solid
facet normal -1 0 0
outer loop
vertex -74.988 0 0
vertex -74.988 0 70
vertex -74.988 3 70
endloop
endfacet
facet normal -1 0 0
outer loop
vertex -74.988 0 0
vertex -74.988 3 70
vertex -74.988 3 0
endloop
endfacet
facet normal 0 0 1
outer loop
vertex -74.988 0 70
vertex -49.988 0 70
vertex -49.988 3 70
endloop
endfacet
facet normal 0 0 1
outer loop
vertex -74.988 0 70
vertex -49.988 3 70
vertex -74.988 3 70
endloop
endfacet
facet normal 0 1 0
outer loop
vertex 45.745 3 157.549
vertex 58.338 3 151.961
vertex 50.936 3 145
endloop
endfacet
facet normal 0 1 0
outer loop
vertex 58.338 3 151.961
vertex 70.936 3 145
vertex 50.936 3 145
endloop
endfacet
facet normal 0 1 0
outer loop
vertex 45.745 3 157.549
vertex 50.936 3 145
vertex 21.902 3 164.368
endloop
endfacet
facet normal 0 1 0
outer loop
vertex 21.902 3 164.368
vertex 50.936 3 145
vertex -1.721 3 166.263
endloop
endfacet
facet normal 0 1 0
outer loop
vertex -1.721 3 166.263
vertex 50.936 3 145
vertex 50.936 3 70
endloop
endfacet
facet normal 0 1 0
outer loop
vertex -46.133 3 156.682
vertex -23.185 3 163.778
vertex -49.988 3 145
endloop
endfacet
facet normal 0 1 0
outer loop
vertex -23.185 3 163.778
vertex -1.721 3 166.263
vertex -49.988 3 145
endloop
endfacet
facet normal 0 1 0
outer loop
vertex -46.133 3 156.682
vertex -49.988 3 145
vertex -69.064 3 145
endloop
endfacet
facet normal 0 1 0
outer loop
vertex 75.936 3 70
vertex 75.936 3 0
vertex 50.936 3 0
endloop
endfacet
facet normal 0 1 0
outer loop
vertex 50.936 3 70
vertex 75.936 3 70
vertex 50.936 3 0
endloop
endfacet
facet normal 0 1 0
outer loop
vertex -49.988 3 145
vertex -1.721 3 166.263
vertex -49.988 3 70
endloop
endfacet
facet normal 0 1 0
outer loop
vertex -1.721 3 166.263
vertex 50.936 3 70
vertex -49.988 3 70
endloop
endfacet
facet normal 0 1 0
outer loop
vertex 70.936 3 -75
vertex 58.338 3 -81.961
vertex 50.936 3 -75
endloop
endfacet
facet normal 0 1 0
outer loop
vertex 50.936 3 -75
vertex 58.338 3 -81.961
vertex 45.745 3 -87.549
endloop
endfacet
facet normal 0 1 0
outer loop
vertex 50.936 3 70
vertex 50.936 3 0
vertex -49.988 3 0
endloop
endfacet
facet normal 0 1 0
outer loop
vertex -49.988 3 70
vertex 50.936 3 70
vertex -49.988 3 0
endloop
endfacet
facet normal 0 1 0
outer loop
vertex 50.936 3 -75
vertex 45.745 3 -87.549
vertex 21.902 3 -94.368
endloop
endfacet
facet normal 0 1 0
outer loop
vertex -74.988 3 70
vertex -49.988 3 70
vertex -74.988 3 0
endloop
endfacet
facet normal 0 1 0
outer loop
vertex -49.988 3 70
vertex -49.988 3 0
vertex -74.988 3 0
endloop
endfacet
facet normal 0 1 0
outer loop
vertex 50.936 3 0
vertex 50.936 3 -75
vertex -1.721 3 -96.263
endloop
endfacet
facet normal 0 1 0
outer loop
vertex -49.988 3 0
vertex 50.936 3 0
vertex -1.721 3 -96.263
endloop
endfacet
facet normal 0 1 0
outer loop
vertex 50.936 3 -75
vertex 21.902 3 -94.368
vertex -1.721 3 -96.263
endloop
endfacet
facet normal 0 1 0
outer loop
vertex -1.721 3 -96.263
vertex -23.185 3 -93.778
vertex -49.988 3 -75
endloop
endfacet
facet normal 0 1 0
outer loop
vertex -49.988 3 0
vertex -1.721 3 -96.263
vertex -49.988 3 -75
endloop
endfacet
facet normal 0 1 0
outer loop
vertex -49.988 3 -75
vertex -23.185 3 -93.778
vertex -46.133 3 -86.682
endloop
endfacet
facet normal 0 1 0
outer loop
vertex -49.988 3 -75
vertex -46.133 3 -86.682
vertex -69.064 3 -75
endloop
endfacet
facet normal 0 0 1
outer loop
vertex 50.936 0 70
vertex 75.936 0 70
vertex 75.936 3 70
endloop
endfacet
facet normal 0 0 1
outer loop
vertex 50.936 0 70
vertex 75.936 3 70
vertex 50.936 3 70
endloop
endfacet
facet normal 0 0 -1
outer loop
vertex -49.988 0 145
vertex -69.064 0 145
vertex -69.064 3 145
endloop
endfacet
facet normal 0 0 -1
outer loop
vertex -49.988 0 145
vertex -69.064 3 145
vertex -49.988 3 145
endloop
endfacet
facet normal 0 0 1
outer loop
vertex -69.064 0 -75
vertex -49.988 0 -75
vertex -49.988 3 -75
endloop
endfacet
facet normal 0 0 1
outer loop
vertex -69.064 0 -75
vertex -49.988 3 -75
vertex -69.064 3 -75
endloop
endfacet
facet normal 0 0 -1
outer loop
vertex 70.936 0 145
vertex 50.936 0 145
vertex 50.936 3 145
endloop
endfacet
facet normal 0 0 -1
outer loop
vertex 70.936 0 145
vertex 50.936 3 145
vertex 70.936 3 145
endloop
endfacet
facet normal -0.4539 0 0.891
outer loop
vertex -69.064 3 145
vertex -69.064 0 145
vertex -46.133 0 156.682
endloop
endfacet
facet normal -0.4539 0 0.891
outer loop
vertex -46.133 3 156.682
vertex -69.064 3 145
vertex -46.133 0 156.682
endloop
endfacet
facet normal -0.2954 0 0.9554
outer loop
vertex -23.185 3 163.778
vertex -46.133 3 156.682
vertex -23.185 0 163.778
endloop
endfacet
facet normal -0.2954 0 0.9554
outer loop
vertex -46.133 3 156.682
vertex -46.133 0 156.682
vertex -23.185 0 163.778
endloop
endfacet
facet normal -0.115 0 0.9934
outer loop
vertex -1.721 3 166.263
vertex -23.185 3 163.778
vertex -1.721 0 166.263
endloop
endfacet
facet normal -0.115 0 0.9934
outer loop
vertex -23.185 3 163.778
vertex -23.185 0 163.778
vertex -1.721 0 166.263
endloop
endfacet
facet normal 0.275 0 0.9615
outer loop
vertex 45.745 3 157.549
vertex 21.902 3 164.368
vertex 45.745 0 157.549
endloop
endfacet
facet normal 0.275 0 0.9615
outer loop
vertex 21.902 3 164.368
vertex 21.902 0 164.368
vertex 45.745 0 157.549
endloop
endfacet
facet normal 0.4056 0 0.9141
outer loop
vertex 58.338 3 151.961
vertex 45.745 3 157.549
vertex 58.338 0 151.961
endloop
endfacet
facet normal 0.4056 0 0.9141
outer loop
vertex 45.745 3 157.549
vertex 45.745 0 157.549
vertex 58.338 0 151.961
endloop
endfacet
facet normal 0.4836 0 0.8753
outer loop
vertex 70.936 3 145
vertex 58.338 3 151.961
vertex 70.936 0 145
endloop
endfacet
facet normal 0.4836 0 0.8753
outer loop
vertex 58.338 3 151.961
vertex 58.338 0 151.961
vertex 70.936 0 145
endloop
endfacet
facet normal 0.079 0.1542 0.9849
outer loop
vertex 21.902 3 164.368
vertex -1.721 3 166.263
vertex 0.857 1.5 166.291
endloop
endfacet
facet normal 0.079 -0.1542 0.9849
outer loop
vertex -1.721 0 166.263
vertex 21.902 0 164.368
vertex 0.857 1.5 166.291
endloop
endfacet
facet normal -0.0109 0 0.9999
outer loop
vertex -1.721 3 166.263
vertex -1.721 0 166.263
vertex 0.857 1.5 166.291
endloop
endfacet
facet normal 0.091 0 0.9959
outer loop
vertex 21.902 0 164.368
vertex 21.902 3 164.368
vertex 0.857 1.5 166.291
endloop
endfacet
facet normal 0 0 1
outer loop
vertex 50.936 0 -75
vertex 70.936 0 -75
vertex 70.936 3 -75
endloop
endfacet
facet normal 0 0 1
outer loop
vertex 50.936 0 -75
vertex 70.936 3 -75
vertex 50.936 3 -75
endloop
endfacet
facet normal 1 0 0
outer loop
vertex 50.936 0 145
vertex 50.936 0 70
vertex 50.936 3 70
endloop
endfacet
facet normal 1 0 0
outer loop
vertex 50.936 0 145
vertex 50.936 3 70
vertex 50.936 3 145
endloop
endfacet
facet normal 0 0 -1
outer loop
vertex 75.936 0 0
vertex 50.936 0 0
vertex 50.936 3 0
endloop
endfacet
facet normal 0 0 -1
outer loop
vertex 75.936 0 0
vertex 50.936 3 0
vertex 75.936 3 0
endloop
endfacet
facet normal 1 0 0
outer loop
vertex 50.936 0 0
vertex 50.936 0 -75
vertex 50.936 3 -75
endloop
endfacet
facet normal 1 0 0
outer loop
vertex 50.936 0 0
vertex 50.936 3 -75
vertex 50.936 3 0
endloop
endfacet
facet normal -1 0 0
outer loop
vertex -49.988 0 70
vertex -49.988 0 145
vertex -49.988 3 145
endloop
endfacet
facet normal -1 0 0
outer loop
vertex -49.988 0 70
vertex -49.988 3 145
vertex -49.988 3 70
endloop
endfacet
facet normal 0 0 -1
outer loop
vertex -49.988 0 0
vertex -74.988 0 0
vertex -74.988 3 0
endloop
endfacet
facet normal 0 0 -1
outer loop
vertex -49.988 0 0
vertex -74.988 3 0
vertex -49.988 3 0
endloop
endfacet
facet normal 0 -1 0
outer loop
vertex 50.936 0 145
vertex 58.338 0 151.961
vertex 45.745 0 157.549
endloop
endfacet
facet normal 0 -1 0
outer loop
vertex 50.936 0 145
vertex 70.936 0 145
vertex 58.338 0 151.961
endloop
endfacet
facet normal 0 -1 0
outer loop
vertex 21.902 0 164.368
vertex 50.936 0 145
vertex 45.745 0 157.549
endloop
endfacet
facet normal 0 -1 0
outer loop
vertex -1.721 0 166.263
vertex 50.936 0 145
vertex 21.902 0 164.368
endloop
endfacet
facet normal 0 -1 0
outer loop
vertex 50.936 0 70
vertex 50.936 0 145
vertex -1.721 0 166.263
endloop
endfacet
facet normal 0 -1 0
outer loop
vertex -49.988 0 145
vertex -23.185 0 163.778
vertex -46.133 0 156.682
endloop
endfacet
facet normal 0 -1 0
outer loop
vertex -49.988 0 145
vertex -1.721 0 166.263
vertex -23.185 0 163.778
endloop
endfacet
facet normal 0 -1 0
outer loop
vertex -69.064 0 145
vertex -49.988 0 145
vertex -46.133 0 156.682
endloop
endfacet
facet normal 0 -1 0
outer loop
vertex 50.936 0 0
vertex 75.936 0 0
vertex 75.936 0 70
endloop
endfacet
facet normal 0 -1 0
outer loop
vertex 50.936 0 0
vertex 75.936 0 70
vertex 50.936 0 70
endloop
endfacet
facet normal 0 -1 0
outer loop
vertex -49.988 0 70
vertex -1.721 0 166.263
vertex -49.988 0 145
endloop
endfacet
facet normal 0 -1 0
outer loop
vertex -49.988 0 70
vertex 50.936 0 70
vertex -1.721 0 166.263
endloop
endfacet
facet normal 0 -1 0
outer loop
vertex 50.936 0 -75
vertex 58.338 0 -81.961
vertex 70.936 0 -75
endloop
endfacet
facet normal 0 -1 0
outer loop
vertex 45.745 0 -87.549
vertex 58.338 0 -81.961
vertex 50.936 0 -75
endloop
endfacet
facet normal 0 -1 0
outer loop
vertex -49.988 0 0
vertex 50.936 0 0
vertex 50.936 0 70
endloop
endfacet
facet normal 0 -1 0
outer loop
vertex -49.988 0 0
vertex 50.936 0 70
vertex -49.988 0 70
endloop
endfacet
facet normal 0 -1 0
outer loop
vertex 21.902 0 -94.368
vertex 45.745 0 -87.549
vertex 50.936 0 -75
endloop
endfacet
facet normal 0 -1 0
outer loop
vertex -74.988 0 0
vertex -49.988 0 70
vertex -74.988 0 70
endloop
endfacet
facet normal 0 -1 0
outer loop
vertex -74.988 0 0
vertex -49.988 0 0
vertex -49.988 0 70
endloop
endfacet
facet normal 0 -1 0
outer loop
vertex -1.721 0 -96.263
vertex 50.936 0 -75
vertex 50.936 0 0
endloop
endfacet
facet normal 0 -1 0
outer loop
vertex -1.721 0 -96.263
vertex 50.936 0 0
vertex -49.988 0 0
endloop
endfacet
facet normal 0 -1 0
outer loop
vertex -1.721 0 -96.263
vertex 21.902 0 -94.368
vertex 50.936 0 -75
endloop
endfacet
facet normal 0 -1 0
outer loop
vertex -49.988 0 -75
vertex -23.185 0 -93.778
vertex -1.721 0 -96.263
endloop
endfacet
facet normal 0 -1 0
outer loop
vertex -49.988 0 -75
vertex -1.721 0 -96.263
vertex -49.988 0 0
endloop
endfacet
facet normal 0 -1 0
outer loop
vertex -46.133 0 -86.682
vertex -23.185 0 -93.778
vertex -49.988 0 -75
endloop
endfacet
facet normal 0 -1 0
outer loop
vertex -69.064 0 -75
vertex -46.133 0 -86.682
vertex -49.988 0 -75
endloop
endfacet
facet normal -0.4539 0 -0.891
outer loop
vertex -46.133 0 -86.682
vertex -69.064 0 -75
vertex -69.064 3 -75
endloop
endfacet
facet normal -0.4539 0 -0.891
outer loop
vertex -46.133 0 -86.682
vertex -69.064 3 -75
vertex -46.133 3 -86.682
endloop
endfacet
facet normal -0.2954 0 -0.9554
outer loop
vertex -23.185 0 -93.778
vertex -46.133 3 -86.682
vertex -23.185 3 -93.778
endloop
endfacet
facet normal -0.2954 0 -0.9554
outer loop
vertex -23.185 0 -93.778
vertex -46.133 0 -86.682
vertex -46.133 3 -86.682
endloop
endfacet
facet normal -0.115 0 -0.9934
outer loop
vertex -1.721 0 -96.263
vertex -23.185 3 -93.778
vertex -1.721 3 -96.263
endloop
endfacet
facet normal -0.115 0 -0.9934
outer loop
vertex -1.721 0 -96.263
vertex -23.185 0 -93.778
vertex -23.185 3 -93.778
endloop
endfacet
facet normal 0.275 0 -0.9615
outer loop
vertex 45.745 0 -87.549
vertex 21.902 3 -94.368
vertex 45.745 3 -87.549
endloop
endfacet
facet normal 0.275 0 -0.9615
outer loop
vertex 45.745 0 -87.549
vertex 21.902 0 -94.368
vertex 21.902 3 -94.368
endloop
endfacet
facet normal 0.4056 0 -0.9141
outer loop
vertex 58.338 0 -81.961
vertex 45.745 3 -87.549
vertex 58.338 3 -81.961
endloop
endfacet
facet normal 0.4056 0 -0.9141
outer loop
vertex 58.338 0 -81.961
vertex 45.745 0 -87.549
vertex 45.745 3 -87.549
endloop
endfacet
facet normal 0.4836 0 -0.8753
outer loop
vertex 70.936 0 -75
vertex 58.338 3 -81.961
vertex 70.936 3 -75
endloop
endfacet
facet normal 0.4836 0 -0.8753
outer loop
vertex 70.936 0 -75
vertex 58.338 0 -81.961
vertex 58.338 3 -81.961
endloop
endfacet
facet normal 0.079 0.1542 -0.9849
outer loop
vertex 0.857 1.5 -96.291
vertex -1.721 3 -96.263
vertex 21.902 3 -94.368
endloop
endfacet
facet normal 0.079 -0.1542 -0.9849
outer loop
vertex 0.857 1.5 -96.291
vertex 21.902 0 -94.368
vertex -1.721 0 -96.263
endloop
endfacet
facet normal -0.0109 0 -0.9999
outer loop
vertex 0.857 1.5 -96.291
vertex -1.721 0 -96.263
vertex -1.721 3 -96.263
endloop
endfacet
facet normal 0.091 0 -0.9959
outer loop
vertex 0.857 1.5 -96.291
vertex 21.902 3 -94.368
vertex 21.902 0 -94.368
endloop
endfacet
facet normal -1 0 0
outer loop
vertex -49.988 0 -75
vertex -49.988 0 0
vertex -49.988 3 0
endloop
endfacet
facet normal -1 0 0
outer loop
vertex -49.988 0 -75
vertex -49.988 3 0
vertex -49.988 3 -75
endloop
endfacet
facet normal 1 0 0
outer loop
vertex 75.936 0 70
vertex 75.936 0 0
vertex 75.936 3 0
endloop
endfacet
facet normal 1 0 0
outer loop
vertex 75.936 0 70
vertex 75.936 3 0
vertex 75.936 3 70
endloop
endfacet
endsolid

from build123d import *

# Parameters (mm, degrees)
EXTRUDE_1_DEPTH = 3


with BuildPart() as part:
    # 草图1 → 凸台-拉伸1 (new body)
    with BuildSketch(Plane(origin=(0, 0, 0), x_dir=(1, 0, 0), z_dir=(0, 1, 0))):
        with BuildLine():
            Line((-49.987744463, 0), (-49.987744463, 75))
            Line((-49.987744463, 75), (-69.064059337, 75))
            add(Edge.make_bspline(
                [(-69.064059337, 75), (0.777424166, 117.582810978), (70.935940663, 75)],
                knots=[0, 0, 0, 1, 1, 1], degree=2))
            Line((70.935940663, 75), (50.935940663, 75))
            Line((50.935940663, 75), (50.935940663, 0))
            Line((50.935940663, 0), (75.935940663, 0))
            Line((75.935940663, 0), (75.935940663, -70))
            Line((75.935940663, -70), (50.935940663, -70))
            Line((50.935940663, -70), (50.935940663, -145))
            Line((50.935940663, -145), (70.935940663, -145))
            add(Edge.make_bspline(
                [(-69.064059337, -145), (0.777424166, -187.582810978), (70.935940663, -145)],
                knots=[0, 0, 0, 1, 1, 1], degree=2))
            Line((-69.064059337, -145), (-49.987744463, -145))
            Line((-49.987744463, -145), (-49.987744463, -70))
            Line((-49.987744463, -70), (-74.987744463, -70))
            Line((-74.987744463, -70), (-74.987744463, 0))
            Line((-74.987744463, 0), (-49.987744463, 0))
        make_face()
    extrude(amount=EXTRUDE_1_DEPTH)


solid = part.part
